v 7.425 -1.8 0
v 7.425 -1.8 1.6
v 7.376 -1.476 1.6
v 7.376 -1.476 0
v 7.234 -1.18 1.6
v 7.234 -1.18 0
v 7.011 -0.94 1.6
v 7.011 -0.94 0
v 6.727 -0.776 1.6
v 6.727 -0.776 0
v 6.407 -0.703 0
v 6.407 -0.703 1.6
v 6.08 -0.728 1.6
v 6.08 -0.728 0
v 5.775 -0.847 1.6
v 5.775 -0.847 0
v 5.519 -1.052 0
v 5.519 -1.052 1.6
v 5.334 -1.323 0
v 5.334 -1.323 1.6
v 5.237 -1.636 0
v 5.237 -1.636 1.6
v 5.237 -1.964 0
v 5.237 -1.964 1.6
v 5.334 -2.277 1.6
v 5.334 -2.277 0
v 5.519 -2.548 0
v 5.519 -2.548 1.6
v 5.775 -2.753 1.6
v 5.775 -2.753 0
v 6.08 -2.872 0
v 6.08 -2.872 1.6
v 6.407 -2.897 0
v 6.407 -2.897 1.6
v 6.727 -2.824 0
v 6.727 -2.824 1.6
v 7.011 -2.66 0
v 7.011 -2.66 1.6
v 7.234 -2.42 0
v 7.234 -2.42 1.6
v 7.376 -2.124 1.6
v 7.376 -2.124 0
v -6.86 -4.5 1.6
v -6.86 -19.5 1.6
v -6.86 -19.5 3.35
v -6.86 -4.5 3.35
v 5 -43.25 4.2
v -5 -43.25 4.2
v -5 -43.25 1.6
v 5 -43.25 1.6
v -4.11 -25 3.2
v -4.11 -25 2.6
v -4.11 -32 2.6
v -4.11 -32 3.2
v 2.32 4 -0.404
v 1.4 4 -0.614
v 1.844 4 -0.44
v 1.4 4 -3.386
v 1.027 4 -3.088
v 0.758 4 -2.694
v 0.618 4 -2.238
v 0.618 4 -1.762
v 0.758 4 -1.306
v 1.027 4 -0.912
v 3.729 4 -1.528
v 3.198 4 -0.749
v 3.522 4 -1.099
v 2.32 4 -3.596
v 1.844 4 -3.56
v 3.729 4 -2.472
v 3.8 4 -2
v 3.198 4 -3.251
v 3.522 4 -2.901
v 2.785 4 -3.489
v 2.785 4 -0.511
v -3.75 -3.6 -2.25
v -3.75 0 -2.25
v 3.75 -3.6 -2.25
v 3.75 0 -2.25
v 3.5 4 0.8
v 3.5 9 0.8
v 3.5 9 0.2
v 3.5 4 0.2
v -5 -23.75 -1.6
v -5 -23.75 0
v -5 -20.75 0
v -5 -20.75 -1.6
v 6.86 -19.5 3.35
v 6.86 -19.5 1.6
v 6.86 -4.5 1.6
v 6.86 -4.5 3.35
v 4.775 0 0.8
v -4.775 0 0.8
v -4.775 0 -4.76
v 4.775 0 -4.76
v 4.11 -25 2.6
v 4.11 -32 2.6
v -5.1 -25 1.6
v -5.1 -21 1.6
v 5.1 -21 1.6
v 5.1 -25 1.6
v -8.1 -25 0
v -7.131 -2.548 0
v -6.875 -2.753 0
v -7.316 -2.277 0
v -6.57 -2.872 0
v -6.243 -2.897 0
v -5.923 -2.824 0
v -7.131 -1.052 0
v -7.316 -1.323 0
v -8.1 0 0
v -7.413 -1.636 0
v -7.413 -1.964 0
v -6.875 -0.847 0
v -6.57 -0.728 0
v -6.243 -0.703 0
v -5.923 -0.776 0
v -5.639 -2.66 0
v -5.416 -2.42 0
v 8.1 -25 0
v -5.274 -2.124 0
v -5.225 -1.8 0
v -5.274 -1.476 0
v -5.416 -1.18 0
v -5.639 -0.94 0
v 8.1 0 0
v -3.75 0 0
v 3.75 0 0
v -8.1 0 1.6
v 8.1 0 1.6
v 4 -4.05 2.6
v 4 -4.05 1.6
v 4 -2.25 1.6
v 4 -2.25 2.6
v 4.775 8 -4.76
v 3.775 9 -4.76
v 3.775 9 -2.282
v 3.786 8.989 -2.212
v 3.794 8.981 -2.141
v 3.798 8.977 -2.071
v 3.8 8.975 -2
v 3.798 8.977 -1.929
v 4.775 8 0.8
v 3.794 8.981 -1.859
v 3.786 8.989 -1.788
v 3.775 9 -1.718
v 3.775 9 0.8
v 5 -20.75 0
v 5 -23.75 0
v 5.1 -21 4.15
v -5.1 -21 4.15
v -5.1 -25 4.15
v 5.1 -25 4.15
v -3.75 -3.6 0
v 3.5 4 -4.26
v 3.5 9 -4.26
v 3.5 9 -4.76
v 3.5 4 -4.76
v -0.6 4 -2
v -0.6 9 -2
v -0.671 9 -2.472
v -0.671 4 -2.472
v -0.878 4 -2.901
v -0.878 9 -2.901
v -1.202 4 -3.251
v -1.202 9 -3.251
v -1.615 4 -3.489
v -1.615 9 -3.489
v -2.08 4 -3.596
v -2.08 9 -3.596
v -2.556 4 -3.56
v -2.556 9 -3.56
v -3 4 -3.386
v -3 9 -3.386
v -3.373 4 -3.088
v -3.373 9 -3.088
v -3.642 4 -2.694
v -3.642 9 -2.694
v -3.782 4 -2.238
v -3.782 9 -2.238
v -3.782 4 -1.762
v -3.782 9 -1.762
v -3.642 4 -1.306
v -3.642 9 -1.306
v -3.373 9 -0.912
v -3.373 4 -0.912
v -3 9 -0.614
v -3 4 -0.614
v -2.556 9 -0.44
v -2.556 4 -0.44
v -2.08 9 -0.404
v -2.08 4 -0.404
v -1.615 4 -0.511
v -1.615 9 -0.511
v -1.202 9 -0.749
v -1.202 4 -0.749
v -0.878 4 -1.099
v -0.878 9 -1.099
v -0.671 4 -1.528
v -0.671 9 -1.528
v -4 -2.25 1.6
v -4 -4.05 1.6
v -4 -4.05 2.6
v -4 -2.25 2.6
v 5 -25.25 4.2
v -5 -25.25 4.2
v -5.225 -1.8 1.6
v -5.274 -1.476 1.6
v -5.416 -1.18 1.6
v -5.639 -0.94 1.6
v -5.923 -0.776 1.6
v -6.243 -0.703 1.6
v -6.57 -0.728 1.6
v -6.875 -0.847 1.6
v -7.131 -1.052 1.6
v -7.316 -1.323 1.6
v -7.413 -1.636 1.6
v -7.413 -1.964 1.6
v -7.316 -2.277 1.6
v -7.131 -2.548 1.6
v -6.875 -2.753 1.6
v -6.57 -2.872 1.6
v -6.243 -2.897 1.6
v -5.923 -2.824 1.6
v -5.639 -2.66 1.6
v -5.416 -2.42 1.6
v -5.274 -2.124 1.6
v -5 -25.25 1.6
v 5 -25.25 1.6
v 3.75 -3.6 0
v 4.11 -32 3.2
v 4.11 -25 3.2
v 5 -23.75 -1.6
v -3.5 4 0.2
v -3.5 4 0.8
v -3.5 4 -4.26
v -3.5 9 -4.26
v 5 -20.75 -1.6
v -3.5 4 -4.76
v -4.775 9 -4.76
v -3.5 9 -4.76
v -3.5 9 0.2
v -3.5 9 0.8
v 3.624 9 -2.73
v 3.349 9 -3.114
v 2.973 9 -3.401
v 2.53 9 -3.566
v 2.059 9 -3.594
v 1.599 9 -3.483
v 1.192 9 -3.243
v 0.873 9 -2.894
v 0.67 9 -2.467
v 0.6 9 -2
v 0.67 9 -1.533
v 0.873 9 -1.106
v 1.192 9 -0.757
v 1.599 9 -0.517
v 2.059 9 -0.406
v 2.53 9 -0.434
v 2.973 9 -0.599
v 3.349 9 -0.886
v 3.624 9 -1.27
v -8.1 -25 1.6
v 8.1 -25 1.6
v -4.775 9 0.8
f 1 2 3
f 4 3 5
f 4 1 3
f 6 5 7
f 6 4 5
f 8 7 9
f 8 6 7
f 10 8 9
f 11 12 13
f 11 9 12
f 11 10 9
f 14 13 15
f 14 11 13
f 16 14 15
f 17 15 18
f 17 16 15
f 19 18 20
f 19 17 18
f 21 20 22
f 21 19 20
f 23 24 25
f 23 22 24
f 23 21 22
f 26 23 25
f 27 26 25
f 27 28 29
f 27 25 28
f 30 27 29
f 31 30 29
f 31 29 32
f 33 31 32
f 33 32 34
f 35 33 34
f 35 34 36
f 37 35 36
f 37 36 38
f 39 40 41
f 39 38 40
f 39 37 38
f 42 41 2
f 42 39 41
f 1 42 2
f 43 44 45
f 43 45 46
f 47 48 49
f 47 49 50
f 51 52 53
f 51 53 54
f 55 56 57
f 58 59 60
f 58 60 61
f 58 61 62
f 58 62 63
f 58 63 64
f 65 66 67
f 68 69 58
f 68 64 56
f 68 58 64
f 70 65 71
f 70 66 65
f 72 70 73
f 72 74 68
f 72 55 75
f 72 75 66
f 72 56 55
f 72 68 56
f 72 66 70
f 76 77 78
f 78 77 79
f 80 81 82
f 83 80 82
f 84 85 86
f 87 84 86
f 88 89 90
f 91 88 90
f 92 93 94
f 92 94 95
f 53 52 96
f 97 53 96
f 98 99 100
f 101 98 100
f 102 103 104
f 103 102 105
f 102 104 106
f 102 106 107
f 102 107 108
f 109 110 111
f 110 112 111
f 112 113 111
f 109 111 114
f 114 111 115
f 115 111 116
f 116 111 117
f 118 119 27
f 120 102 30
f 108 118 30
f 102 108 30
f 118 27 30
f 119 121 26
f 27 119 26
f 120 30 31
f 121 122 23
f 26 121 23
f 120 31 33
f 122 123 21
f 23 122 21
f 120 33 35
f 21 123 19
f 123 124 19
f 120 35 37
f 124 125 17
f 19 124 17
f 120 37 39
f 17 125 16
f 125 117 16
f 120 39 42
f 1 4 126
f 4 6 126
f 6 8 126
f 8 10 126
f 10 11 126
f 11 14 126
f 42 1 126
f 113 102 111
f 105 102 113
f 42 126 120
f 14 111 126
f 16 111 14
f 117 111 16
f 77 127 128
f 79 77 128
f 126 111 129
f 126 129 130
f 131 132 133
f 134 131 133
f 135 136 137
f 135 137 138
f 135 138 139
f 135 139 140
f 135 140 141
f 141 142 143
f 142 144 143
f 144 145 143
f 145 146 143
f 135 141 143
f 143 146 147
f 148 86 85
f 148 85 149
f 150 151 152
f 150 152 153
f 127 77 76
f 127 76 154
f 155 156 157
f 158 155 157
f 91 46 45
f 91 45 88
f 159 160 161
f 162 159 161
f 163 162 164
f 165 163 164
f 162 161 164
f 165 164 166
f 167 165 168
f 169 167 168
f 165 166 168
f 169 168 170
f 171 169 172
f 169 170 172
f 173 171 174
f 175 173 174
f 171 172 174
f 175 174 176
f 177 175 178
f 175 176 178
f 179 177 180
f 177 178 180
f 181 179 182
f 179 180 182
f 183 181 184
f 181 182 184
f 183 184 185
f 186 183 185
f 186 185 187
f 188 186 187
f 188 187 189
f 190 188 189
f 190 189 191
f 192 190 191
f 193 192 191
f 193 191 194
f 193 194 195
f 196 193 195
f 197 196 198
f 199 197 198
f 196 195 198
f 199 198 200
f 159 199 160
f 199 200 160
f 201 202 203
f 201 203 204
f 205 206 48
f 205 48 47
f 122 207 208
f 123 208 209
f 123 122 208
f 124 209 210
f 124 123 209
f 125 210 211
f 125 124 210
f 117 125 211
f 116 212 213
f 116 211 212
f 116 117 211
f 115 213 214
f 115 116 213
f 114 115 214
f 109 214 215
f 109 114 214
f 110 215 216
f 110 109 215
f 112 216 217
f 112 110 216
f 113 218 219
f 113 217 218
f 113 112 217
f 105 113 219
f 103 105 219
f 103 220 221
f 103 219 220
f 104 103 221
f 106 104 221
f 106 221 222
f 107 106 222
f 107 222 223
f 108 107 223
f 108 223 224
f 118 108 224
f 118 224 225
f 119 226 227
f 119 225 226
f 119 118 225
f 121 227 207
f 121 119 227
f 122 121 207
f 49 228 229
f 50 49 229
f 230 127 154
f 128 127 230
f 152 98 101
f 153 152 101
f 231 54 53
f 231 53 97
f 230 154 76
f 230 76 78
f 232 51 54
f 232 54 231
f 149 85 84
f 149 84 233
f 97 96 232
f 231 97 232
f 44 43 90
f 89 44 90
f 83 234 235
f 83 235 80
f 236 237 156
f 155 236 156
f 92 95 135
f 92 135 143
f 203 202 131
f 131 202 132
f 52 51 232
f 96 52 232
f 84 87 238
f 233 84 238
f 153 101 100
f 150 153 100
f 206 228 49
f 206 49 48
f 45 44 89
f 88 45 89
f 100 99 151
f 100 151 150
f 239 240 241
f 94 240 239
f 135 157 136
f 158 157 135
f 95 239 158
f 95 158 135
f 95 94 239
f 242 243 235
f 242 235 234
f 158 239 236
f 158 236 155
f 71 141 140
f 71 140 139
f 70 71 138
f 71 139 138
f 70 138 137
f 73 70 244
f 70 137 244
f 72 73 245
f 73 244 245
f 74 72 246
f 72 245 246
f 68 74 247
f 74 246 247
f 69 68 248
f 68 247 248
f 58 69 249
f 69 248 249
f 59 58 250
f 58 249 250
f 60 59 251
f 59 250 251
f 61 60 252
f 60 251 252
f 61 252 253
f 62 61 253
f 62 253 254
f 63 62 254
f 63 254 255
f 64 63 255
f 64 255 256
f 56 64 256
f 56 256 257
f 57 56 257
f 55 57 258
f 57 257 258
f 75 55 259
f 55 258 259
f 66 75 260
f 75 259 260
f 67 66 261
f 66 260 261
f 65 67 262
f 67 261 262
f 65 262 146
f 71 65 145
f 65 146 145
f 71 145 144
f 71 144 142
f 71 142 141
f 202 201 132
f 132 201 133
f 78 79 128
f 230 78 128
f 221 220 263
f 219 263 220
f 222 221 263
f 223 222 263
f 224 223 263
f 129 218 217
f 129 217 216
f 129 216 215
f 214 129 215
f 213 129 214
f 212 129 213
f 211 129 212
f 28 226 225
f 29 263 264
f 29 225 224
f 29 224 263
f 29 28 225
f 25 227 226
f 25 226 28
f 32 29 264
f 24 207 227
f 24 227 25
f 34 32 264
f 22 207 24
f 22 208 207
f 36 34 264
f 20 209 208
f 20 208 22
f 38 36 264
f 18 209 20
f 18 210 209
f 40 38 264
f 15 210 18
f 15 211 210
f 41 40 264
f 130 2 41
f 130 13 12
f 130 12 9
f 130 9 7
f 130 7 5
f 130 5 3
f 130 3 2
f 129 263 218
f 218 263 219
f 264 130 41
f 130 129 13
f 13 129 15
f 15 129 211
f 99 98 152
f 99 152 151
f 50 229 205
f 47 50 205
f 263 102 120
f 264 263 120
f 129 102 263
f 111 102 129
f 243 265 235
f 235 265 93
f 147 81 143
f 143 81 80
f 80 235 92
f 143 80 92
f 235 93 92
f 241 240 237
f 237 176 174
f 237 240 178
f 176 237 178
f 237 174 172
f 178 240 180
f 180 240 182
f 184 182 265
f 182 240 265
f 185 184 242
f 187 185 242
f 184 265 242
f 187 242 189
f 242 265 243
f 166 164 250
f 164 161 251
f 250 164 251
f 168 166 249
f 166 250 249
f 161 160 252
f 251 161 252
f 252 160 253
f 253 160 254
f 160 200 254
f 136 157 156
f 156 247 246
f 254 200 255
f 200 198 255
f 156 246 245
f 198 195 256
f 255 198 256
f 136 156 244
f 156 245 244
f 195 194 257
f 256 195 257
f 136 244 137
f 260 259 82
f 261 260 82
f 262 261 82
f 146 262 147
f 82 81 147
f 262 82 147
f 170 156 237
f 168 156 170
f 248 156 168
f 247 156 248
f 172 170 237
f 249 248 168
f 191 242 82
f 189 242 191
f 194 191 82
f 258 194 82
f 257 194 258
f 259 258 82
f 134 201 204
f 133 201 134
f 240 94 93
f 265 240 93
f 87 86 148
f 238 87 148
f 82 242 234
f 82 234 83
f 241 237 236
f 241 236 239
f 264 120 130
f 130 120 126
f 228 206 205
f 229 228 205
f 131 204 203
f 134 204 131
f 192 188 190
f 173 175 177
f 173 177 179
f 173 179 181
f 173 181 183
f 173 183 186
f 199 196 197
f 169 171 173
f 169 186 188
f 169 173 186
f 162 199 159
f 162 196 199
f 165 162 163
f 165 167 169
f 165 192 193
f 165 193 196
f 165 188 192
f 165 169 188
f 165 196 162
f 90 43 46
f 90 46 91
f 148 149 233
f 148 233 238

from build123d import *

# Parameters (mm, degrees)
SKETCH_W        = 16.2
SKETCH_H        = 25
PAD_DEPTH       = 1.6
SKETCH001_R     = 1.1
POCKET_DEPTH    = 1.601
SKETCH002_W     = 9.55
SKETCH002_H     = 5.56
PAD001_DEPTH    = 9
CHAMFER_SIZE    = 1
SKETCH003_W     = 7
SKETCH003_H     = 5
POCKET001_DEPTH = 5
SKETCH004_R     = 1.6
POCKET002_DEPTH = 5
SKETCH005_W     = 7.5
SKETCH005_H     = 2.25
PAD002_DEPTH    = 3.6
SKETCH006_W     = 10
SKETCH006_H     = 3
PAD003_DEPTH    = 1.6
SKETCH007_W     = 10.2
SKETCH007_H     = 4
PAD004_DEPTH    = 2.55
SKETCH008_W     = 8.22
SKETCH008_H     = 0.6
PAD005_DEPTH    = 7
SKETCH009_W     = 8
SKETCH009_H     = 1.8
PAD006_DEPTH    = 1
SKETCH010_W     = 13.72
SKETCH010_H     = 15
PAD007_DEPTH    = 1.75
SKETCH011_W     = 10
SKETCH011_H     = 2.6
PAD008_DEPTH    = 18


with BuildPart() as mainboard:
    # Sketch → Pad (new body)
    with BuildSketch(Plane.XY):
        with Locations((0, -12.5)):
            Rectangle(SKETCH_W, SKETCH_H)
    extrude(amount=PAD_DEPTH)

    # Sketch001 → Pocket (cut, through all)
    with BuildSketch(Plane.XY):
        with Locations((-6.325, -1.8)):
            Circle(SKETCH001_R)
        with Locations((6.325, -1.8)):
            Circle(SKETCH001_R)
    extrude(amount=POCKET_DEPTH, mode=Mode.SUBTRACT)


with BuildPart() as irsens:
    # Sketch002 → Pad001 (new body)
    with BuildSketch(Plane.XZ):
        with Locations((0, -1.98)):
            Rectangle(SKETCH002_W, SKETCH002_H)
    extrude(amount=-PAD001_DEPTH)

    # Chamfer
    chamfer_edges = [irsens.edges().sort_by_distance(p)[0] for p in [
        (4.775, 9, -1.98),
    ]]
    chamfer(chamfer_edges, length=CHAMFER_SIZE)

    # Sketch003 (on Face5 of Chamfer) → Pocket001 (cut)
    with BuildSketch(Plane(origin=(0, 9, 0), x_dir=(1, 0, 0), z_dir=(0, 1, 0))):
        with Locations((0, 6.76)):
            Rectangle(SKETCH003_W, SKETCH003_H)
        with Locations((0, -2.7)):
            Rectangle(SKETCH003_W, SKETCH003_H)
    extrude(amount=-POCKET001_DEPTH, mode=Mode.SUBTRACT)

    # Sketch004 (on Face3 of Pocket001) → Pocket002 (cut)
    with BuildSketch(Plane(origin=(0, 9, 0), x_dir=(1, 0, 0), z_dir=(0, 1, 0))):
        with Locations((-2.2, 2)):
            Circle(SKETCH004_R)
        with Locations((2.2, 2)):
            Circle(SKETCH004_R)
    extrude(amount=-POCKET002_DEPTH, mode=Mode.SUBTRACT)


with BuildPart() as irconnect:
    # Sketch005 → Pad002 (new body)
    with BuildSketch(Plane.XZ):
        with Locations((0, -1.125)):
            Rectangle(SKETCH005_W, SKETCH005_H)
    extrude(amount=PAD002_DEPTH)


with BuildPart() as pinsolderpoints:
    # Sketch006 → Pad003 (new body)
    with BuildSketch(Plane.XY):
        with Locations((0, -22.25)):
            Rectangle(SKETCH006_W, SKETCH006_H)
    extrude(amount=-PAD003_DEPTH)


with BuildPart() as pinmount:
    # Sketch007 (on DatumPlane) → Pad004 (new body)
    with BuildSketch(Plane.XY.offset(1.6)):
        with Locations((0, -23)):
            Rectangle(SKETCH007_W, SKETCH007_H)
    extrude(amount=PAD004_DEPTH)


with BuildPart() as pins:
    # Sketch008 (on DatumPlane) → Pad005 (new body)
    with BuildSketch(Plane.XZ.offset(25)):
        with Locations((0, 2.9)):
            Rectangle(SKETCH008_W, SKETCH008_H)
    extrude(amount=PAD005_DEPTH)


with BuildPart() as irsenssolder:
    # Sketch009 (on DatumPlane) → Pad006 (new body)
    with BuildSketch(Plane.XY.offset(1.6)):
        with Locations((0, -3.15)):
            Rectangle(SKETCH009_W, SKETCH009_H)
    extrude(amount=PAD006_DEPTH)


with BuildPart() as chips:
    # Sketch010 (on DatumPlane) → Pad007 (new body)
    with BuildSketch(Plane.XY.offset(1.6)):
        with Locations((0, -12)):
            Rectangle(SKETCH010_W, SKETCH010_H)
    extrude(amount=PAD007_DEPTH)


with BuildPart() as pinconnectors:
    # Sketch011 (on DatumPlane) → Pad008 (new body)
    with BuildSketch(Plane.XZ.offset(25.25)):
        with Locations((0, 2.9)):
            Rectangle(SKETCH011_W, SKETCH011_H)
    extrude(amount=PAD008_DEPTH)


solid = Compound([mainboard.part, irsens.part, irconnect.part, pinsolderpoints.part, pinmount.part, pins.part, irsenssolder.part, chips.part, pinconnectors.part])
